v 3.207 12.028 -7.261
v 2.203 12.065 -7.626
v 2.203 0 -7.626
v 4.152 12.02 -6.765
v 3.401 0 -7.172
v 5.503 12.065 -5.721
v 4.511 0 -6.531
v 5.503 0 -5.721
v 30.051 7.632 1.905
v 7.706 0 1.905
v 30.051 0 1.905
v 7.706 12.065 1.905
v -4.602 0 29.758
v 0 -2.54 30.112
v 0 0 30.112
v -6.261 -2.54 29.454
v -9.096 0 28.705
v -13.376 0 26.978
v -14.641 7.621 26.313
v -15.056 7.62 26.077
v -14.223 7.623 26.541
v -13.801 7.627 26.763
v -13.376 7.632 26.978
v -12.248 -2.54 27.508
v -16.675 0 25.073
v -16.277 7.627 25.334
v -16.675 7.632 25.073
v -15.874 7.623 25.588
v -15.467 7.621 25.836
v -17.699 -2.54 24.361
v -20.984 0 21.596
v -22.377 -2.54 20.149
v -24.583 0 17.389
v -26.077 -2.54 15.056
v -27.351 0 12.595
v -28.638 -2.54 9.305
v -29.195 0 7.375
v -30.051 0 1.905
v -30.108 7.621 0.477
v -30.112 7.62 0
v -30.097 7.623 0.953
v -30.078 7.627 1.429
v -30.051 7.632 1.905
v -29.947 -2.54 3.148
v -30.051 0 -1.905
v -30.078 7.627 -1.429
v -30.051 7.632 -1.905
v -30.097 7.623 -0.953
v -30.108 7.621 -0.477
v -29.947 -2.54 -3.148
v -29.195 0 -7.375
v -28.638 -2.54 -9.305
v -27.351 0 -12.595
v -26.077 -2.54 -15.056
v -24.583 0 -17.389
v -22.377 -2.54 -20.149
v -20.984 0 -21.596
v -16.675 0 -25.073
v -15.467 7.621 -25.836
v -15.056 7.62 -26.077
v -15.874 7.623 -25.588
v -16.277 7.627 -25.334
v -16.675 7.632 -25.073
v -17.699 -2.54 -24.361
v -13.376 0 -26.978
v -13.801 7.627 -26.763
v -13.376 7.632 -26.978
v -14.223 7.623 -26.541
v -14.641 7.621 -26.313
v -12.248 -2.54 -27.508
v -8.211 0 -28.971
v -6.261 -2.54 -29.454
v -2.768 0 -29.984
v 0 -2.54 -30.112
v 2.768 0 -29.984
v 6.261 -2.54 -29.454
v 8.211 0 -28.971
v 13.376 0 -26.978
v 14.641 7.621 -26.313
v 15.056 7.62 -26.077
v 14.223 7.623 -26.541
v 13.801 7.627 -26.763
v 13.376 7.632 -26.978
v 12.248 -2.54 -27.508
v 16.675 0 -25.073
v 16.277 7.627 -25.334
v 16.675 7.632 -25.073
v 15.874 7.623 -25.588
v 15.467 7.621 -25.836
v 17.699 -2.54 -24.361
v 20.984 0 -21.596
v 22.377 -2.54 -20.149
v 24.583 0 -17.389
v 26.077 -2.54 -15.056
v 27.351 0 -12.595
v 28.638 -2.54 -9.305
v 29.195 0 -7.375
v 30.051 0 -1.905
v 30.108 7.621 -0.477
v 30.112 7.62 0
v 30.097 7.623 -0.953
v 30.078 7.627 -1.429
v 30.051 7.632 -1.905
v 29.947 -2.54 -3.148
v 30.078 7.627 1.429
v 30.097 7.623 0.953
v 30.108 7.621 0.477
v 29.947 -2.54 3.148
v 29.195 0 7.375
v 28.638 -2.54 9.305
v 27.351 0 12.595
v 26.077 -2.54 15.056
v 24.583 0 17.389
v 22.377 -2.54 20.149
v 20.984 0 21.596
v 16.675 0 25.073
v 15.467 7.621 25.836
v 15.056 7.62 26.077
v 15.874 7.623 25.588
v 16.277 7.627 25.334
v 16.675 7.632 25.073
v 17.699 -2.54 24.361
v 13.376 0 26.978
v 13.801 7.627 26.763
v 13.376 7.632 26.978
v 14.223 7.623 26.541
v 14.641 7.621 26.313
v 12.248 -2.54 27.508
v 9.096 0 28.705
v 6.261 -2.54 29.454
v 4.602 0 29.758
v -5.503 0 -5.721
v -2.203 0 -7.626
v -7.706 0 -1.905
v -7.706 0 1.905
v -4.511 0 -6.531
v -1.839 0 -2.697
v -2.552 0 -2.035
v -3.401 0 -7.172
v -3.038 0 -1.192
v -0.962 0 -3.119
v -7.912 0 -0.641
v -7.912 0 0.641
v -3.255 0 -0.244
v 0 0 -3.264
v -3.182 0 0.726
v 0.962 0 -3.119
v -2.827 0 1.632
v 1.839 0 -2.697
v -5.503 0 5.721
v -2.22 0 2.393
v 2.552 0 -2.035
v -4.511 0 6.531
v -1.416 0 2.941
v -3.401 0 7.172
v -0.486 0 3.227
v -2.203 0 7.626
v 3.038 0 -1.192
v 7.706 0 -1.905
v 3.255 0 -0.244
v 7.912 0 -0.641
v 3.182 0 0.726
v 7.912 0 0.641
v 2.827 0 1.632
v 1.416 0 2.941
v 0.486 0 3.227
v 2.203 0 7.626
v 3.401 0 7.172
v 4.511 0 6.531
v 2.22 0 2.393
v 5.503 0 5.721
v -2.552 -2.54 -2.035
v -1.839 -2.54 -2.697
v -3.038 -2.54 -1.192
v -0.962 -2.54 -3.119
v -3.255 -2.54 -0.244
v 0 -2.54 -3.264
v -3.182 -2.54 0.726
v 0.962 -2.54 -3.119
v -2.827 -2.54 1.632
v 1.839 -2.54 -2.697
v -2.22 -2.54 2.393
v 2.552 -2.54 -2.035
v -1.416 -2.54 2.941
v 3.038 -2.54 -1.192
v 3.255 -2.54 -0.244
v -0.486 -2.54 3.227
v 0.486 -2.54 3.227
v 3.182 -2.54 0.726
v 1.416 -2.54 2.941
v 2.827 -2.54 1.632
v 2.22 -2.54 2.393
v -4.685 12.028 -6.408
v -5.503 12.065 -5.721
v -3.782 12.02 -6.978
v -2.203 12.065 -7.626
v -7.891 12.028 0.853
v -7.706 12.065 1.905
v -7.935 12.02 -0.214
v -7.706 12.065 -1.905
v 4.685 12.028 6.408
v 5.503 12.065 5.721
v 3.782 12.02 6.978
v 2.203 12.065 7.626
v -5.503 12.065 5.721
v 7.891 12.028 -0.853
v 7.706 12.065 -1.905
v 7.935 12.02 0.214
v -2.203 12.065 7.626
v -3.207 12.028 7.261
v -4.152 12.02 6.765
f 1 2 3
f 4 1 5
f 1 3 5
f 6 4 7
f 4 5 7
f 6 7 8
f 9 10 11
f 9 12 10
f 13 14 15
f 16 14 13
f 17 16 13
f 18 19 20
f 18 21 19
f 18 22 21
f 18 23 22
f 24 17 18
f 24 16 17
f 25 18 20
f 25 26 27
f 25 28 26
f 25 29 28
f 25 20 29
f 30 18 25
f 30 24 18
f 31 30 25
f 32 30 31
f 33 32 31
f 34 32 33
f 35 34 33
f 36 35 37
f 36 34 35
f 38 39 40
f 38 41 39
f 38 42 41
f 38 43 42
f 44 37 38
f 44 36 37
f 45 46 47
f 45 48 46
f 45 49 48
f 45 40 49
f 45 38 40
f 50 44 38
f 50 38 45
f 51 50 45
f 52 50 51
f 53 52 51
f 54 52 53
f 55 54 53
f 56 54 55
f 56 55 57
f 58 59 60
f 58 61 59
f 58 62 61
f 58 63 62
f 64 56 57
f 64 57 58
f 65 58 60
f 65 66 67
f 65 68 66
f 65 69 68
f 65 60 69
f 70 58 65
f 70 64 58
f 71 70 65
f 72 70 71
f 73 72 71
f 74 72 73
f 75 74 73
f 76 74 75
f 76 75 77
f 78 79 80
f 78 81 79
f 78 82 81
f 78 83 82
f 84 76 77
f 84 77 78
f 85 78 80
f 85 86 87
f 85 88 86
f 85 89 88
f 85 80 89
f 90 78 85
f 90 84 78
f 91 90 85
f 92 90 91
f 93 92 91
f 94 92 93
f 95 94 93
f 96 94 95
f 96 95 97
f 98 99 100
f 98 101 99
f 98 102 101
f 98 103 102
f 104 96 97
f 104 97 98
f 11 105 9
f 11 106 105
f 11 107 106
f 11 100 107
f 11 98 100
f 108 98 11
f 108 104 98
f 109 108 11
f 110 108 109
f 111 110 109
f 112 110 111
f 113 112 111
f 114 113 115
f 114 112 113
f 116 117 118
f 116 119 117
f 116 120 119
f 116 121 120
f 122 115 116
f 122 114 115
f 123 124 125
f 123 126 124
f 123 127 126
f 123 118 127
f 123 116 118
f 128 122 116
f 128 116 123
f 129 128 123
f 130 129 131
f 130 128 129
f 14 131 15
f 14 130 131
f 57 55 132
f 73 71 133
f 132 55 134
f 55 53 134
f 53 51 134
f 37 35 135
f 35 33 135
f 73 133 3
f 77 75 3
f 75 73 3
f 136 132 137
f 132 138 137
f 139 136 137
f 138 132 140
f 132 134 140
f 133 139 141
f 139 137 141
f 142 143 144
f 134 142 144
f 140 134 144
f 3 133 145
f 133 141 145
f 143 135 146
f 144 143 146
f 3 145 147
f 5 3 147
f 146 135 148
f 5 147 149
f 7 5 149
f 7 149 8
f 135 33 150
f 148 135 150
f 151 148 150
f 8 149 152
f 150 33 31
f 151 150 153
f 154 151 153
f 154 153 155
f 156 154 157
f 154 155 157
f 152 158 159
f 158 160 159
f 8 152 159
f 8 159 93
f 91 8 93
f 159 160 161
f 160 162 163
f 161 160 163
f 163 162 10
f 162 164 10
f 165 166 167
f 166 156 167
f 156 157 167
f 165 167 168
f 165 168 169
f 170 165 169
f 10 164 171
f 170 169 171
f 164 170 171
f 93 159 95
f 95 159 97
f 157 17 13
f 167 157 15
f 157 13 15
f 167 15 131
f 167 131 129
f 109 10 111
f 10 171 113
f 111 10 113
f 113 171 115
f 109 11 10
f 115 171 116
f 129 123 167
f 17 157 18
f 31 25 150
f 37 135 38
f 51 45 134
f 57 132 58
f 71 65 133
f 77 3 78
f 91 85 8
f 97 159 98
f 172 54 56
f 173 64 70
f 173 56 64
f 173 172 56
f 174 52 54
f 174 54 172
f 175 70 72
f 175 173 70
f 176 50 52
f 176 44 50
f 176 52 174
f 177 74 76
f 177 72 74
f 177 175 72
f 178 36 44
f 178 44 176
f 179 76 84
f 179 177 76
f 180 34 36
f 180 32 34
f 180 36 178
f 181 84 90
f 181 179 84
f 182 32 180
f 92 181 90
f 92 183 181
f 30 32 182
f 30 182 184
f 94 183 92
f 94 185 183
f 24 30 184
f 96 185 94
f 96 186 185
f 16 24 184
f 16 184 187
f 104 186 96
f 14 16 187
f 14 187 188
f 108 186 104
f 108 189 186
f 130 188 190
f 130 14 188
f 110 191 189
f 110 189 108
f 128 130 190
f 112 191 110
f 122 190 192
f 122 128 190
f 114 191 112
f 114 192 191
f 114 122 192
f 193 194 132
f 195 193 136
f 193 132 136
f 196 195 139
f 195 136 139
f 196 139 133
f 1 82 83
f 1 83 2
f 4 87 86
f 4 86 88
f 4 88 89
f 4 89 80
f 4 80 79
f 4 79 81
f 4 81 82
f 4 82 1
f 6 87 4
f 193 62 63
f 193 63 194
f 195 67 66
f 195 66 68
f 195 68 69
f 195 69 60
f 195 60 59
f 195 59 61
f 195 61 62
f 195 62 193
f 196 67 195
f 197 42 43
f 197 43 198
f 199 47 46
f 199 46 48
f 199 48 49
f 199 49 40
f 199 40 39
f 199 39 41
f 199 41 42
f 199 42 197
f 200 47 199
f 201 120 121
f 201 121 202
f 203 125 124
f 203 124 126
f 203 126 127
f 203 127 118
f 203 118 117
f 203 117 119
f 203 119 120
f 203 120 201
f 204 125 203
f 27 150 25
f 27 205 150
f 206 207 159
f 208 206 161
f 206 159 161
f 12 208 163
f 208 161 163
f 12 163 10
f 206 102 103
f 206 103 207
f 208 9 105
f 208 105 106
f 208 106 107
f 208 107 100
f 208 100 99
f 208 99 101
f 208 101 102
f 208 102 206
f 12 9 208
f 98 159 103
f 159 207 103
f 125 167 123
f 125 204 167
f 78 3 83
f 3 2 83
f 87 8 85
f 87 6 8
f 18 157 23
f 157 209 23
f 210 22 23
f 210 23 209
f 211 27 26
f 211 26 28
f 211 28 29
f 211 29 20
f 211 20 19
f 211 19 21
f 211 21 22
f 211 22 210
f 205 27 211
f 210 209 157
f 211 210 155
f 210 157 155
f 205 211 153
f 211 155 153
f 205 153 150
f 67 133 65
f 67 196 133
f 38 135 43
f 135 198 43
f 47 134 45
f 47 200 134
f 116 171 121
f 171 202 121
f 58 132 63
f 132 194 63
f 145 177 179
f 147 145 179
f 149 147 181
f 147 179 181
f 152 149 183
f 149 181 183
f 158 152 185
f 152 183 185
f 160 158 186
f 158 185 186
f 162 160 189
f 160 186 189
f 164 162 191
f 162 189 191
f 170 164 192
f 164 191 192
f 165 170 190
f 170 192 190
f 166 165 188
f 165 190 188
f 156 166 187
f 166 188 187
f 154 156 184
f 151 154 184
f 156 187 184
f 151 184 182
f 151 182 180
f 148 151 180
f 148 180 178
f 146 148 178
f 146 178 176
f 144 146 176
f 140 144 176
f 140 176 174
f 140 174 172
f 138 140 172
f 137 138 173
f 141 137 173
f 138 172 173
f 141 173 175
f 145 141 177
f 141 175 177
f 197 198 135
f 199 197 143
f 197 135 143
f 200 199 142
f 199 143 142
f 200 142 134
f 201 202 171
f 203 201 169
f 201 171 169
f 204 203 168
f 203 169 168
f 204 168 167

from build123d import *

# Parameters (mm, degrees)
SKETCH5_R           = 30.1117
BOSS_EXTRUDE3_DEPTH = 2.54
BOSS_EXTRUDE4_DEPTH = 1.905
CIRPATTERN2_COUNT   = 6
SKETCH8_R           = 34.925
SKETCH8_R_2         = 30.1117
SKETCH8_R_3         = 7.9375
SKETCH8_R_4         = 3.2639
CUT_EXTRUDE3_DEPTH  = 46.107338309
SKETCH9_R           = 7.9375
SKETCH9_R_2         = 3.2639
BOSS_EXTRUDE5_DEPTH = 2.54


with BuildPart() as part:
    # Sketch5 → Boss-Extrude3 (new body)
    with BuildSketch(Plane(origin=(0, 0, 0), x_dir=(1, 0, 0), z_dir=(0, 1, 0))):
        with Locations(Location((0, 0, 0), (0, 0, 270))):
            Circle(SKETCH5_R)
    extrude(amount=-BOSS_EXTRUDE3_DEPTH)

    # Sketch7 → Boss-Extrude4 (add, symmetric)
    with BuildSketch(Plane.XY):
        Polygon((30.1117, 0), (30.1117, 7.62), (6.35, 12.33424), (6.35, 0), align=None)
    boss_extrude4 = extrude(amount=BOSS_EXTRUDE4_DEPTH, both=True)

    # CirPattern2: Boss-Extrude4 ×6 about axis
    cirpattern2_axis = Axis((0, 0, 0), (0, 1, 0))
    for i in range(1, CIRPATTERN2_COUNT):
        add(boss_extrude4.rotate(cirpattern2_axis, i * 360 / CIRPATTERN2_COUNT))

    # Sketch8 → Cut-Extrude3 (cut, through all)
    # profile 1 of 3: a face of its own
    with BuildSketch(Plane.XZ.offset(2.54)):
        Circle(SKETCH8_R)
        with Locations(Location((0, 0, 0), (0, 0, 90))):
            Circle(SKETCH8_R_2, mode=Mode.SUBTRACT)
    # profile 2 of 3: a face of its own
    with BuildSketch(Plane.XZ.offset(2.54)):
        with Locations(Location((0, 0, 0), (0, 0, 270))):
            Circle(SKETCH8_R_3)
        Circle(SKETCH8_R_4, mode=Mode.SUBTRACT)
    # profile 3 of 3: a face of its own
    with BuildSketch(Plane.XZ.offset(2.54)):
        Circle(SKETCH8_R_4)
    extrude(amount=-CUT_EXTRUDE3_DEPTH, mode=Mode.SUBTRACT)

    # Sketch9 → Boss-Extrude5 (add)
    with BuildSketch(Plane.XZ.offset(2.54)):
        Circle(SKETCH9_R)
        with Locations(Location((0, 0, 0), (0, 0, 270))):
            Circle(SKETCH9_R_2, mode=Mode.SUBTRACT)
    extrude(amount=-BOSS_EXTRUDE5_DEPTH)


solid = part.part
